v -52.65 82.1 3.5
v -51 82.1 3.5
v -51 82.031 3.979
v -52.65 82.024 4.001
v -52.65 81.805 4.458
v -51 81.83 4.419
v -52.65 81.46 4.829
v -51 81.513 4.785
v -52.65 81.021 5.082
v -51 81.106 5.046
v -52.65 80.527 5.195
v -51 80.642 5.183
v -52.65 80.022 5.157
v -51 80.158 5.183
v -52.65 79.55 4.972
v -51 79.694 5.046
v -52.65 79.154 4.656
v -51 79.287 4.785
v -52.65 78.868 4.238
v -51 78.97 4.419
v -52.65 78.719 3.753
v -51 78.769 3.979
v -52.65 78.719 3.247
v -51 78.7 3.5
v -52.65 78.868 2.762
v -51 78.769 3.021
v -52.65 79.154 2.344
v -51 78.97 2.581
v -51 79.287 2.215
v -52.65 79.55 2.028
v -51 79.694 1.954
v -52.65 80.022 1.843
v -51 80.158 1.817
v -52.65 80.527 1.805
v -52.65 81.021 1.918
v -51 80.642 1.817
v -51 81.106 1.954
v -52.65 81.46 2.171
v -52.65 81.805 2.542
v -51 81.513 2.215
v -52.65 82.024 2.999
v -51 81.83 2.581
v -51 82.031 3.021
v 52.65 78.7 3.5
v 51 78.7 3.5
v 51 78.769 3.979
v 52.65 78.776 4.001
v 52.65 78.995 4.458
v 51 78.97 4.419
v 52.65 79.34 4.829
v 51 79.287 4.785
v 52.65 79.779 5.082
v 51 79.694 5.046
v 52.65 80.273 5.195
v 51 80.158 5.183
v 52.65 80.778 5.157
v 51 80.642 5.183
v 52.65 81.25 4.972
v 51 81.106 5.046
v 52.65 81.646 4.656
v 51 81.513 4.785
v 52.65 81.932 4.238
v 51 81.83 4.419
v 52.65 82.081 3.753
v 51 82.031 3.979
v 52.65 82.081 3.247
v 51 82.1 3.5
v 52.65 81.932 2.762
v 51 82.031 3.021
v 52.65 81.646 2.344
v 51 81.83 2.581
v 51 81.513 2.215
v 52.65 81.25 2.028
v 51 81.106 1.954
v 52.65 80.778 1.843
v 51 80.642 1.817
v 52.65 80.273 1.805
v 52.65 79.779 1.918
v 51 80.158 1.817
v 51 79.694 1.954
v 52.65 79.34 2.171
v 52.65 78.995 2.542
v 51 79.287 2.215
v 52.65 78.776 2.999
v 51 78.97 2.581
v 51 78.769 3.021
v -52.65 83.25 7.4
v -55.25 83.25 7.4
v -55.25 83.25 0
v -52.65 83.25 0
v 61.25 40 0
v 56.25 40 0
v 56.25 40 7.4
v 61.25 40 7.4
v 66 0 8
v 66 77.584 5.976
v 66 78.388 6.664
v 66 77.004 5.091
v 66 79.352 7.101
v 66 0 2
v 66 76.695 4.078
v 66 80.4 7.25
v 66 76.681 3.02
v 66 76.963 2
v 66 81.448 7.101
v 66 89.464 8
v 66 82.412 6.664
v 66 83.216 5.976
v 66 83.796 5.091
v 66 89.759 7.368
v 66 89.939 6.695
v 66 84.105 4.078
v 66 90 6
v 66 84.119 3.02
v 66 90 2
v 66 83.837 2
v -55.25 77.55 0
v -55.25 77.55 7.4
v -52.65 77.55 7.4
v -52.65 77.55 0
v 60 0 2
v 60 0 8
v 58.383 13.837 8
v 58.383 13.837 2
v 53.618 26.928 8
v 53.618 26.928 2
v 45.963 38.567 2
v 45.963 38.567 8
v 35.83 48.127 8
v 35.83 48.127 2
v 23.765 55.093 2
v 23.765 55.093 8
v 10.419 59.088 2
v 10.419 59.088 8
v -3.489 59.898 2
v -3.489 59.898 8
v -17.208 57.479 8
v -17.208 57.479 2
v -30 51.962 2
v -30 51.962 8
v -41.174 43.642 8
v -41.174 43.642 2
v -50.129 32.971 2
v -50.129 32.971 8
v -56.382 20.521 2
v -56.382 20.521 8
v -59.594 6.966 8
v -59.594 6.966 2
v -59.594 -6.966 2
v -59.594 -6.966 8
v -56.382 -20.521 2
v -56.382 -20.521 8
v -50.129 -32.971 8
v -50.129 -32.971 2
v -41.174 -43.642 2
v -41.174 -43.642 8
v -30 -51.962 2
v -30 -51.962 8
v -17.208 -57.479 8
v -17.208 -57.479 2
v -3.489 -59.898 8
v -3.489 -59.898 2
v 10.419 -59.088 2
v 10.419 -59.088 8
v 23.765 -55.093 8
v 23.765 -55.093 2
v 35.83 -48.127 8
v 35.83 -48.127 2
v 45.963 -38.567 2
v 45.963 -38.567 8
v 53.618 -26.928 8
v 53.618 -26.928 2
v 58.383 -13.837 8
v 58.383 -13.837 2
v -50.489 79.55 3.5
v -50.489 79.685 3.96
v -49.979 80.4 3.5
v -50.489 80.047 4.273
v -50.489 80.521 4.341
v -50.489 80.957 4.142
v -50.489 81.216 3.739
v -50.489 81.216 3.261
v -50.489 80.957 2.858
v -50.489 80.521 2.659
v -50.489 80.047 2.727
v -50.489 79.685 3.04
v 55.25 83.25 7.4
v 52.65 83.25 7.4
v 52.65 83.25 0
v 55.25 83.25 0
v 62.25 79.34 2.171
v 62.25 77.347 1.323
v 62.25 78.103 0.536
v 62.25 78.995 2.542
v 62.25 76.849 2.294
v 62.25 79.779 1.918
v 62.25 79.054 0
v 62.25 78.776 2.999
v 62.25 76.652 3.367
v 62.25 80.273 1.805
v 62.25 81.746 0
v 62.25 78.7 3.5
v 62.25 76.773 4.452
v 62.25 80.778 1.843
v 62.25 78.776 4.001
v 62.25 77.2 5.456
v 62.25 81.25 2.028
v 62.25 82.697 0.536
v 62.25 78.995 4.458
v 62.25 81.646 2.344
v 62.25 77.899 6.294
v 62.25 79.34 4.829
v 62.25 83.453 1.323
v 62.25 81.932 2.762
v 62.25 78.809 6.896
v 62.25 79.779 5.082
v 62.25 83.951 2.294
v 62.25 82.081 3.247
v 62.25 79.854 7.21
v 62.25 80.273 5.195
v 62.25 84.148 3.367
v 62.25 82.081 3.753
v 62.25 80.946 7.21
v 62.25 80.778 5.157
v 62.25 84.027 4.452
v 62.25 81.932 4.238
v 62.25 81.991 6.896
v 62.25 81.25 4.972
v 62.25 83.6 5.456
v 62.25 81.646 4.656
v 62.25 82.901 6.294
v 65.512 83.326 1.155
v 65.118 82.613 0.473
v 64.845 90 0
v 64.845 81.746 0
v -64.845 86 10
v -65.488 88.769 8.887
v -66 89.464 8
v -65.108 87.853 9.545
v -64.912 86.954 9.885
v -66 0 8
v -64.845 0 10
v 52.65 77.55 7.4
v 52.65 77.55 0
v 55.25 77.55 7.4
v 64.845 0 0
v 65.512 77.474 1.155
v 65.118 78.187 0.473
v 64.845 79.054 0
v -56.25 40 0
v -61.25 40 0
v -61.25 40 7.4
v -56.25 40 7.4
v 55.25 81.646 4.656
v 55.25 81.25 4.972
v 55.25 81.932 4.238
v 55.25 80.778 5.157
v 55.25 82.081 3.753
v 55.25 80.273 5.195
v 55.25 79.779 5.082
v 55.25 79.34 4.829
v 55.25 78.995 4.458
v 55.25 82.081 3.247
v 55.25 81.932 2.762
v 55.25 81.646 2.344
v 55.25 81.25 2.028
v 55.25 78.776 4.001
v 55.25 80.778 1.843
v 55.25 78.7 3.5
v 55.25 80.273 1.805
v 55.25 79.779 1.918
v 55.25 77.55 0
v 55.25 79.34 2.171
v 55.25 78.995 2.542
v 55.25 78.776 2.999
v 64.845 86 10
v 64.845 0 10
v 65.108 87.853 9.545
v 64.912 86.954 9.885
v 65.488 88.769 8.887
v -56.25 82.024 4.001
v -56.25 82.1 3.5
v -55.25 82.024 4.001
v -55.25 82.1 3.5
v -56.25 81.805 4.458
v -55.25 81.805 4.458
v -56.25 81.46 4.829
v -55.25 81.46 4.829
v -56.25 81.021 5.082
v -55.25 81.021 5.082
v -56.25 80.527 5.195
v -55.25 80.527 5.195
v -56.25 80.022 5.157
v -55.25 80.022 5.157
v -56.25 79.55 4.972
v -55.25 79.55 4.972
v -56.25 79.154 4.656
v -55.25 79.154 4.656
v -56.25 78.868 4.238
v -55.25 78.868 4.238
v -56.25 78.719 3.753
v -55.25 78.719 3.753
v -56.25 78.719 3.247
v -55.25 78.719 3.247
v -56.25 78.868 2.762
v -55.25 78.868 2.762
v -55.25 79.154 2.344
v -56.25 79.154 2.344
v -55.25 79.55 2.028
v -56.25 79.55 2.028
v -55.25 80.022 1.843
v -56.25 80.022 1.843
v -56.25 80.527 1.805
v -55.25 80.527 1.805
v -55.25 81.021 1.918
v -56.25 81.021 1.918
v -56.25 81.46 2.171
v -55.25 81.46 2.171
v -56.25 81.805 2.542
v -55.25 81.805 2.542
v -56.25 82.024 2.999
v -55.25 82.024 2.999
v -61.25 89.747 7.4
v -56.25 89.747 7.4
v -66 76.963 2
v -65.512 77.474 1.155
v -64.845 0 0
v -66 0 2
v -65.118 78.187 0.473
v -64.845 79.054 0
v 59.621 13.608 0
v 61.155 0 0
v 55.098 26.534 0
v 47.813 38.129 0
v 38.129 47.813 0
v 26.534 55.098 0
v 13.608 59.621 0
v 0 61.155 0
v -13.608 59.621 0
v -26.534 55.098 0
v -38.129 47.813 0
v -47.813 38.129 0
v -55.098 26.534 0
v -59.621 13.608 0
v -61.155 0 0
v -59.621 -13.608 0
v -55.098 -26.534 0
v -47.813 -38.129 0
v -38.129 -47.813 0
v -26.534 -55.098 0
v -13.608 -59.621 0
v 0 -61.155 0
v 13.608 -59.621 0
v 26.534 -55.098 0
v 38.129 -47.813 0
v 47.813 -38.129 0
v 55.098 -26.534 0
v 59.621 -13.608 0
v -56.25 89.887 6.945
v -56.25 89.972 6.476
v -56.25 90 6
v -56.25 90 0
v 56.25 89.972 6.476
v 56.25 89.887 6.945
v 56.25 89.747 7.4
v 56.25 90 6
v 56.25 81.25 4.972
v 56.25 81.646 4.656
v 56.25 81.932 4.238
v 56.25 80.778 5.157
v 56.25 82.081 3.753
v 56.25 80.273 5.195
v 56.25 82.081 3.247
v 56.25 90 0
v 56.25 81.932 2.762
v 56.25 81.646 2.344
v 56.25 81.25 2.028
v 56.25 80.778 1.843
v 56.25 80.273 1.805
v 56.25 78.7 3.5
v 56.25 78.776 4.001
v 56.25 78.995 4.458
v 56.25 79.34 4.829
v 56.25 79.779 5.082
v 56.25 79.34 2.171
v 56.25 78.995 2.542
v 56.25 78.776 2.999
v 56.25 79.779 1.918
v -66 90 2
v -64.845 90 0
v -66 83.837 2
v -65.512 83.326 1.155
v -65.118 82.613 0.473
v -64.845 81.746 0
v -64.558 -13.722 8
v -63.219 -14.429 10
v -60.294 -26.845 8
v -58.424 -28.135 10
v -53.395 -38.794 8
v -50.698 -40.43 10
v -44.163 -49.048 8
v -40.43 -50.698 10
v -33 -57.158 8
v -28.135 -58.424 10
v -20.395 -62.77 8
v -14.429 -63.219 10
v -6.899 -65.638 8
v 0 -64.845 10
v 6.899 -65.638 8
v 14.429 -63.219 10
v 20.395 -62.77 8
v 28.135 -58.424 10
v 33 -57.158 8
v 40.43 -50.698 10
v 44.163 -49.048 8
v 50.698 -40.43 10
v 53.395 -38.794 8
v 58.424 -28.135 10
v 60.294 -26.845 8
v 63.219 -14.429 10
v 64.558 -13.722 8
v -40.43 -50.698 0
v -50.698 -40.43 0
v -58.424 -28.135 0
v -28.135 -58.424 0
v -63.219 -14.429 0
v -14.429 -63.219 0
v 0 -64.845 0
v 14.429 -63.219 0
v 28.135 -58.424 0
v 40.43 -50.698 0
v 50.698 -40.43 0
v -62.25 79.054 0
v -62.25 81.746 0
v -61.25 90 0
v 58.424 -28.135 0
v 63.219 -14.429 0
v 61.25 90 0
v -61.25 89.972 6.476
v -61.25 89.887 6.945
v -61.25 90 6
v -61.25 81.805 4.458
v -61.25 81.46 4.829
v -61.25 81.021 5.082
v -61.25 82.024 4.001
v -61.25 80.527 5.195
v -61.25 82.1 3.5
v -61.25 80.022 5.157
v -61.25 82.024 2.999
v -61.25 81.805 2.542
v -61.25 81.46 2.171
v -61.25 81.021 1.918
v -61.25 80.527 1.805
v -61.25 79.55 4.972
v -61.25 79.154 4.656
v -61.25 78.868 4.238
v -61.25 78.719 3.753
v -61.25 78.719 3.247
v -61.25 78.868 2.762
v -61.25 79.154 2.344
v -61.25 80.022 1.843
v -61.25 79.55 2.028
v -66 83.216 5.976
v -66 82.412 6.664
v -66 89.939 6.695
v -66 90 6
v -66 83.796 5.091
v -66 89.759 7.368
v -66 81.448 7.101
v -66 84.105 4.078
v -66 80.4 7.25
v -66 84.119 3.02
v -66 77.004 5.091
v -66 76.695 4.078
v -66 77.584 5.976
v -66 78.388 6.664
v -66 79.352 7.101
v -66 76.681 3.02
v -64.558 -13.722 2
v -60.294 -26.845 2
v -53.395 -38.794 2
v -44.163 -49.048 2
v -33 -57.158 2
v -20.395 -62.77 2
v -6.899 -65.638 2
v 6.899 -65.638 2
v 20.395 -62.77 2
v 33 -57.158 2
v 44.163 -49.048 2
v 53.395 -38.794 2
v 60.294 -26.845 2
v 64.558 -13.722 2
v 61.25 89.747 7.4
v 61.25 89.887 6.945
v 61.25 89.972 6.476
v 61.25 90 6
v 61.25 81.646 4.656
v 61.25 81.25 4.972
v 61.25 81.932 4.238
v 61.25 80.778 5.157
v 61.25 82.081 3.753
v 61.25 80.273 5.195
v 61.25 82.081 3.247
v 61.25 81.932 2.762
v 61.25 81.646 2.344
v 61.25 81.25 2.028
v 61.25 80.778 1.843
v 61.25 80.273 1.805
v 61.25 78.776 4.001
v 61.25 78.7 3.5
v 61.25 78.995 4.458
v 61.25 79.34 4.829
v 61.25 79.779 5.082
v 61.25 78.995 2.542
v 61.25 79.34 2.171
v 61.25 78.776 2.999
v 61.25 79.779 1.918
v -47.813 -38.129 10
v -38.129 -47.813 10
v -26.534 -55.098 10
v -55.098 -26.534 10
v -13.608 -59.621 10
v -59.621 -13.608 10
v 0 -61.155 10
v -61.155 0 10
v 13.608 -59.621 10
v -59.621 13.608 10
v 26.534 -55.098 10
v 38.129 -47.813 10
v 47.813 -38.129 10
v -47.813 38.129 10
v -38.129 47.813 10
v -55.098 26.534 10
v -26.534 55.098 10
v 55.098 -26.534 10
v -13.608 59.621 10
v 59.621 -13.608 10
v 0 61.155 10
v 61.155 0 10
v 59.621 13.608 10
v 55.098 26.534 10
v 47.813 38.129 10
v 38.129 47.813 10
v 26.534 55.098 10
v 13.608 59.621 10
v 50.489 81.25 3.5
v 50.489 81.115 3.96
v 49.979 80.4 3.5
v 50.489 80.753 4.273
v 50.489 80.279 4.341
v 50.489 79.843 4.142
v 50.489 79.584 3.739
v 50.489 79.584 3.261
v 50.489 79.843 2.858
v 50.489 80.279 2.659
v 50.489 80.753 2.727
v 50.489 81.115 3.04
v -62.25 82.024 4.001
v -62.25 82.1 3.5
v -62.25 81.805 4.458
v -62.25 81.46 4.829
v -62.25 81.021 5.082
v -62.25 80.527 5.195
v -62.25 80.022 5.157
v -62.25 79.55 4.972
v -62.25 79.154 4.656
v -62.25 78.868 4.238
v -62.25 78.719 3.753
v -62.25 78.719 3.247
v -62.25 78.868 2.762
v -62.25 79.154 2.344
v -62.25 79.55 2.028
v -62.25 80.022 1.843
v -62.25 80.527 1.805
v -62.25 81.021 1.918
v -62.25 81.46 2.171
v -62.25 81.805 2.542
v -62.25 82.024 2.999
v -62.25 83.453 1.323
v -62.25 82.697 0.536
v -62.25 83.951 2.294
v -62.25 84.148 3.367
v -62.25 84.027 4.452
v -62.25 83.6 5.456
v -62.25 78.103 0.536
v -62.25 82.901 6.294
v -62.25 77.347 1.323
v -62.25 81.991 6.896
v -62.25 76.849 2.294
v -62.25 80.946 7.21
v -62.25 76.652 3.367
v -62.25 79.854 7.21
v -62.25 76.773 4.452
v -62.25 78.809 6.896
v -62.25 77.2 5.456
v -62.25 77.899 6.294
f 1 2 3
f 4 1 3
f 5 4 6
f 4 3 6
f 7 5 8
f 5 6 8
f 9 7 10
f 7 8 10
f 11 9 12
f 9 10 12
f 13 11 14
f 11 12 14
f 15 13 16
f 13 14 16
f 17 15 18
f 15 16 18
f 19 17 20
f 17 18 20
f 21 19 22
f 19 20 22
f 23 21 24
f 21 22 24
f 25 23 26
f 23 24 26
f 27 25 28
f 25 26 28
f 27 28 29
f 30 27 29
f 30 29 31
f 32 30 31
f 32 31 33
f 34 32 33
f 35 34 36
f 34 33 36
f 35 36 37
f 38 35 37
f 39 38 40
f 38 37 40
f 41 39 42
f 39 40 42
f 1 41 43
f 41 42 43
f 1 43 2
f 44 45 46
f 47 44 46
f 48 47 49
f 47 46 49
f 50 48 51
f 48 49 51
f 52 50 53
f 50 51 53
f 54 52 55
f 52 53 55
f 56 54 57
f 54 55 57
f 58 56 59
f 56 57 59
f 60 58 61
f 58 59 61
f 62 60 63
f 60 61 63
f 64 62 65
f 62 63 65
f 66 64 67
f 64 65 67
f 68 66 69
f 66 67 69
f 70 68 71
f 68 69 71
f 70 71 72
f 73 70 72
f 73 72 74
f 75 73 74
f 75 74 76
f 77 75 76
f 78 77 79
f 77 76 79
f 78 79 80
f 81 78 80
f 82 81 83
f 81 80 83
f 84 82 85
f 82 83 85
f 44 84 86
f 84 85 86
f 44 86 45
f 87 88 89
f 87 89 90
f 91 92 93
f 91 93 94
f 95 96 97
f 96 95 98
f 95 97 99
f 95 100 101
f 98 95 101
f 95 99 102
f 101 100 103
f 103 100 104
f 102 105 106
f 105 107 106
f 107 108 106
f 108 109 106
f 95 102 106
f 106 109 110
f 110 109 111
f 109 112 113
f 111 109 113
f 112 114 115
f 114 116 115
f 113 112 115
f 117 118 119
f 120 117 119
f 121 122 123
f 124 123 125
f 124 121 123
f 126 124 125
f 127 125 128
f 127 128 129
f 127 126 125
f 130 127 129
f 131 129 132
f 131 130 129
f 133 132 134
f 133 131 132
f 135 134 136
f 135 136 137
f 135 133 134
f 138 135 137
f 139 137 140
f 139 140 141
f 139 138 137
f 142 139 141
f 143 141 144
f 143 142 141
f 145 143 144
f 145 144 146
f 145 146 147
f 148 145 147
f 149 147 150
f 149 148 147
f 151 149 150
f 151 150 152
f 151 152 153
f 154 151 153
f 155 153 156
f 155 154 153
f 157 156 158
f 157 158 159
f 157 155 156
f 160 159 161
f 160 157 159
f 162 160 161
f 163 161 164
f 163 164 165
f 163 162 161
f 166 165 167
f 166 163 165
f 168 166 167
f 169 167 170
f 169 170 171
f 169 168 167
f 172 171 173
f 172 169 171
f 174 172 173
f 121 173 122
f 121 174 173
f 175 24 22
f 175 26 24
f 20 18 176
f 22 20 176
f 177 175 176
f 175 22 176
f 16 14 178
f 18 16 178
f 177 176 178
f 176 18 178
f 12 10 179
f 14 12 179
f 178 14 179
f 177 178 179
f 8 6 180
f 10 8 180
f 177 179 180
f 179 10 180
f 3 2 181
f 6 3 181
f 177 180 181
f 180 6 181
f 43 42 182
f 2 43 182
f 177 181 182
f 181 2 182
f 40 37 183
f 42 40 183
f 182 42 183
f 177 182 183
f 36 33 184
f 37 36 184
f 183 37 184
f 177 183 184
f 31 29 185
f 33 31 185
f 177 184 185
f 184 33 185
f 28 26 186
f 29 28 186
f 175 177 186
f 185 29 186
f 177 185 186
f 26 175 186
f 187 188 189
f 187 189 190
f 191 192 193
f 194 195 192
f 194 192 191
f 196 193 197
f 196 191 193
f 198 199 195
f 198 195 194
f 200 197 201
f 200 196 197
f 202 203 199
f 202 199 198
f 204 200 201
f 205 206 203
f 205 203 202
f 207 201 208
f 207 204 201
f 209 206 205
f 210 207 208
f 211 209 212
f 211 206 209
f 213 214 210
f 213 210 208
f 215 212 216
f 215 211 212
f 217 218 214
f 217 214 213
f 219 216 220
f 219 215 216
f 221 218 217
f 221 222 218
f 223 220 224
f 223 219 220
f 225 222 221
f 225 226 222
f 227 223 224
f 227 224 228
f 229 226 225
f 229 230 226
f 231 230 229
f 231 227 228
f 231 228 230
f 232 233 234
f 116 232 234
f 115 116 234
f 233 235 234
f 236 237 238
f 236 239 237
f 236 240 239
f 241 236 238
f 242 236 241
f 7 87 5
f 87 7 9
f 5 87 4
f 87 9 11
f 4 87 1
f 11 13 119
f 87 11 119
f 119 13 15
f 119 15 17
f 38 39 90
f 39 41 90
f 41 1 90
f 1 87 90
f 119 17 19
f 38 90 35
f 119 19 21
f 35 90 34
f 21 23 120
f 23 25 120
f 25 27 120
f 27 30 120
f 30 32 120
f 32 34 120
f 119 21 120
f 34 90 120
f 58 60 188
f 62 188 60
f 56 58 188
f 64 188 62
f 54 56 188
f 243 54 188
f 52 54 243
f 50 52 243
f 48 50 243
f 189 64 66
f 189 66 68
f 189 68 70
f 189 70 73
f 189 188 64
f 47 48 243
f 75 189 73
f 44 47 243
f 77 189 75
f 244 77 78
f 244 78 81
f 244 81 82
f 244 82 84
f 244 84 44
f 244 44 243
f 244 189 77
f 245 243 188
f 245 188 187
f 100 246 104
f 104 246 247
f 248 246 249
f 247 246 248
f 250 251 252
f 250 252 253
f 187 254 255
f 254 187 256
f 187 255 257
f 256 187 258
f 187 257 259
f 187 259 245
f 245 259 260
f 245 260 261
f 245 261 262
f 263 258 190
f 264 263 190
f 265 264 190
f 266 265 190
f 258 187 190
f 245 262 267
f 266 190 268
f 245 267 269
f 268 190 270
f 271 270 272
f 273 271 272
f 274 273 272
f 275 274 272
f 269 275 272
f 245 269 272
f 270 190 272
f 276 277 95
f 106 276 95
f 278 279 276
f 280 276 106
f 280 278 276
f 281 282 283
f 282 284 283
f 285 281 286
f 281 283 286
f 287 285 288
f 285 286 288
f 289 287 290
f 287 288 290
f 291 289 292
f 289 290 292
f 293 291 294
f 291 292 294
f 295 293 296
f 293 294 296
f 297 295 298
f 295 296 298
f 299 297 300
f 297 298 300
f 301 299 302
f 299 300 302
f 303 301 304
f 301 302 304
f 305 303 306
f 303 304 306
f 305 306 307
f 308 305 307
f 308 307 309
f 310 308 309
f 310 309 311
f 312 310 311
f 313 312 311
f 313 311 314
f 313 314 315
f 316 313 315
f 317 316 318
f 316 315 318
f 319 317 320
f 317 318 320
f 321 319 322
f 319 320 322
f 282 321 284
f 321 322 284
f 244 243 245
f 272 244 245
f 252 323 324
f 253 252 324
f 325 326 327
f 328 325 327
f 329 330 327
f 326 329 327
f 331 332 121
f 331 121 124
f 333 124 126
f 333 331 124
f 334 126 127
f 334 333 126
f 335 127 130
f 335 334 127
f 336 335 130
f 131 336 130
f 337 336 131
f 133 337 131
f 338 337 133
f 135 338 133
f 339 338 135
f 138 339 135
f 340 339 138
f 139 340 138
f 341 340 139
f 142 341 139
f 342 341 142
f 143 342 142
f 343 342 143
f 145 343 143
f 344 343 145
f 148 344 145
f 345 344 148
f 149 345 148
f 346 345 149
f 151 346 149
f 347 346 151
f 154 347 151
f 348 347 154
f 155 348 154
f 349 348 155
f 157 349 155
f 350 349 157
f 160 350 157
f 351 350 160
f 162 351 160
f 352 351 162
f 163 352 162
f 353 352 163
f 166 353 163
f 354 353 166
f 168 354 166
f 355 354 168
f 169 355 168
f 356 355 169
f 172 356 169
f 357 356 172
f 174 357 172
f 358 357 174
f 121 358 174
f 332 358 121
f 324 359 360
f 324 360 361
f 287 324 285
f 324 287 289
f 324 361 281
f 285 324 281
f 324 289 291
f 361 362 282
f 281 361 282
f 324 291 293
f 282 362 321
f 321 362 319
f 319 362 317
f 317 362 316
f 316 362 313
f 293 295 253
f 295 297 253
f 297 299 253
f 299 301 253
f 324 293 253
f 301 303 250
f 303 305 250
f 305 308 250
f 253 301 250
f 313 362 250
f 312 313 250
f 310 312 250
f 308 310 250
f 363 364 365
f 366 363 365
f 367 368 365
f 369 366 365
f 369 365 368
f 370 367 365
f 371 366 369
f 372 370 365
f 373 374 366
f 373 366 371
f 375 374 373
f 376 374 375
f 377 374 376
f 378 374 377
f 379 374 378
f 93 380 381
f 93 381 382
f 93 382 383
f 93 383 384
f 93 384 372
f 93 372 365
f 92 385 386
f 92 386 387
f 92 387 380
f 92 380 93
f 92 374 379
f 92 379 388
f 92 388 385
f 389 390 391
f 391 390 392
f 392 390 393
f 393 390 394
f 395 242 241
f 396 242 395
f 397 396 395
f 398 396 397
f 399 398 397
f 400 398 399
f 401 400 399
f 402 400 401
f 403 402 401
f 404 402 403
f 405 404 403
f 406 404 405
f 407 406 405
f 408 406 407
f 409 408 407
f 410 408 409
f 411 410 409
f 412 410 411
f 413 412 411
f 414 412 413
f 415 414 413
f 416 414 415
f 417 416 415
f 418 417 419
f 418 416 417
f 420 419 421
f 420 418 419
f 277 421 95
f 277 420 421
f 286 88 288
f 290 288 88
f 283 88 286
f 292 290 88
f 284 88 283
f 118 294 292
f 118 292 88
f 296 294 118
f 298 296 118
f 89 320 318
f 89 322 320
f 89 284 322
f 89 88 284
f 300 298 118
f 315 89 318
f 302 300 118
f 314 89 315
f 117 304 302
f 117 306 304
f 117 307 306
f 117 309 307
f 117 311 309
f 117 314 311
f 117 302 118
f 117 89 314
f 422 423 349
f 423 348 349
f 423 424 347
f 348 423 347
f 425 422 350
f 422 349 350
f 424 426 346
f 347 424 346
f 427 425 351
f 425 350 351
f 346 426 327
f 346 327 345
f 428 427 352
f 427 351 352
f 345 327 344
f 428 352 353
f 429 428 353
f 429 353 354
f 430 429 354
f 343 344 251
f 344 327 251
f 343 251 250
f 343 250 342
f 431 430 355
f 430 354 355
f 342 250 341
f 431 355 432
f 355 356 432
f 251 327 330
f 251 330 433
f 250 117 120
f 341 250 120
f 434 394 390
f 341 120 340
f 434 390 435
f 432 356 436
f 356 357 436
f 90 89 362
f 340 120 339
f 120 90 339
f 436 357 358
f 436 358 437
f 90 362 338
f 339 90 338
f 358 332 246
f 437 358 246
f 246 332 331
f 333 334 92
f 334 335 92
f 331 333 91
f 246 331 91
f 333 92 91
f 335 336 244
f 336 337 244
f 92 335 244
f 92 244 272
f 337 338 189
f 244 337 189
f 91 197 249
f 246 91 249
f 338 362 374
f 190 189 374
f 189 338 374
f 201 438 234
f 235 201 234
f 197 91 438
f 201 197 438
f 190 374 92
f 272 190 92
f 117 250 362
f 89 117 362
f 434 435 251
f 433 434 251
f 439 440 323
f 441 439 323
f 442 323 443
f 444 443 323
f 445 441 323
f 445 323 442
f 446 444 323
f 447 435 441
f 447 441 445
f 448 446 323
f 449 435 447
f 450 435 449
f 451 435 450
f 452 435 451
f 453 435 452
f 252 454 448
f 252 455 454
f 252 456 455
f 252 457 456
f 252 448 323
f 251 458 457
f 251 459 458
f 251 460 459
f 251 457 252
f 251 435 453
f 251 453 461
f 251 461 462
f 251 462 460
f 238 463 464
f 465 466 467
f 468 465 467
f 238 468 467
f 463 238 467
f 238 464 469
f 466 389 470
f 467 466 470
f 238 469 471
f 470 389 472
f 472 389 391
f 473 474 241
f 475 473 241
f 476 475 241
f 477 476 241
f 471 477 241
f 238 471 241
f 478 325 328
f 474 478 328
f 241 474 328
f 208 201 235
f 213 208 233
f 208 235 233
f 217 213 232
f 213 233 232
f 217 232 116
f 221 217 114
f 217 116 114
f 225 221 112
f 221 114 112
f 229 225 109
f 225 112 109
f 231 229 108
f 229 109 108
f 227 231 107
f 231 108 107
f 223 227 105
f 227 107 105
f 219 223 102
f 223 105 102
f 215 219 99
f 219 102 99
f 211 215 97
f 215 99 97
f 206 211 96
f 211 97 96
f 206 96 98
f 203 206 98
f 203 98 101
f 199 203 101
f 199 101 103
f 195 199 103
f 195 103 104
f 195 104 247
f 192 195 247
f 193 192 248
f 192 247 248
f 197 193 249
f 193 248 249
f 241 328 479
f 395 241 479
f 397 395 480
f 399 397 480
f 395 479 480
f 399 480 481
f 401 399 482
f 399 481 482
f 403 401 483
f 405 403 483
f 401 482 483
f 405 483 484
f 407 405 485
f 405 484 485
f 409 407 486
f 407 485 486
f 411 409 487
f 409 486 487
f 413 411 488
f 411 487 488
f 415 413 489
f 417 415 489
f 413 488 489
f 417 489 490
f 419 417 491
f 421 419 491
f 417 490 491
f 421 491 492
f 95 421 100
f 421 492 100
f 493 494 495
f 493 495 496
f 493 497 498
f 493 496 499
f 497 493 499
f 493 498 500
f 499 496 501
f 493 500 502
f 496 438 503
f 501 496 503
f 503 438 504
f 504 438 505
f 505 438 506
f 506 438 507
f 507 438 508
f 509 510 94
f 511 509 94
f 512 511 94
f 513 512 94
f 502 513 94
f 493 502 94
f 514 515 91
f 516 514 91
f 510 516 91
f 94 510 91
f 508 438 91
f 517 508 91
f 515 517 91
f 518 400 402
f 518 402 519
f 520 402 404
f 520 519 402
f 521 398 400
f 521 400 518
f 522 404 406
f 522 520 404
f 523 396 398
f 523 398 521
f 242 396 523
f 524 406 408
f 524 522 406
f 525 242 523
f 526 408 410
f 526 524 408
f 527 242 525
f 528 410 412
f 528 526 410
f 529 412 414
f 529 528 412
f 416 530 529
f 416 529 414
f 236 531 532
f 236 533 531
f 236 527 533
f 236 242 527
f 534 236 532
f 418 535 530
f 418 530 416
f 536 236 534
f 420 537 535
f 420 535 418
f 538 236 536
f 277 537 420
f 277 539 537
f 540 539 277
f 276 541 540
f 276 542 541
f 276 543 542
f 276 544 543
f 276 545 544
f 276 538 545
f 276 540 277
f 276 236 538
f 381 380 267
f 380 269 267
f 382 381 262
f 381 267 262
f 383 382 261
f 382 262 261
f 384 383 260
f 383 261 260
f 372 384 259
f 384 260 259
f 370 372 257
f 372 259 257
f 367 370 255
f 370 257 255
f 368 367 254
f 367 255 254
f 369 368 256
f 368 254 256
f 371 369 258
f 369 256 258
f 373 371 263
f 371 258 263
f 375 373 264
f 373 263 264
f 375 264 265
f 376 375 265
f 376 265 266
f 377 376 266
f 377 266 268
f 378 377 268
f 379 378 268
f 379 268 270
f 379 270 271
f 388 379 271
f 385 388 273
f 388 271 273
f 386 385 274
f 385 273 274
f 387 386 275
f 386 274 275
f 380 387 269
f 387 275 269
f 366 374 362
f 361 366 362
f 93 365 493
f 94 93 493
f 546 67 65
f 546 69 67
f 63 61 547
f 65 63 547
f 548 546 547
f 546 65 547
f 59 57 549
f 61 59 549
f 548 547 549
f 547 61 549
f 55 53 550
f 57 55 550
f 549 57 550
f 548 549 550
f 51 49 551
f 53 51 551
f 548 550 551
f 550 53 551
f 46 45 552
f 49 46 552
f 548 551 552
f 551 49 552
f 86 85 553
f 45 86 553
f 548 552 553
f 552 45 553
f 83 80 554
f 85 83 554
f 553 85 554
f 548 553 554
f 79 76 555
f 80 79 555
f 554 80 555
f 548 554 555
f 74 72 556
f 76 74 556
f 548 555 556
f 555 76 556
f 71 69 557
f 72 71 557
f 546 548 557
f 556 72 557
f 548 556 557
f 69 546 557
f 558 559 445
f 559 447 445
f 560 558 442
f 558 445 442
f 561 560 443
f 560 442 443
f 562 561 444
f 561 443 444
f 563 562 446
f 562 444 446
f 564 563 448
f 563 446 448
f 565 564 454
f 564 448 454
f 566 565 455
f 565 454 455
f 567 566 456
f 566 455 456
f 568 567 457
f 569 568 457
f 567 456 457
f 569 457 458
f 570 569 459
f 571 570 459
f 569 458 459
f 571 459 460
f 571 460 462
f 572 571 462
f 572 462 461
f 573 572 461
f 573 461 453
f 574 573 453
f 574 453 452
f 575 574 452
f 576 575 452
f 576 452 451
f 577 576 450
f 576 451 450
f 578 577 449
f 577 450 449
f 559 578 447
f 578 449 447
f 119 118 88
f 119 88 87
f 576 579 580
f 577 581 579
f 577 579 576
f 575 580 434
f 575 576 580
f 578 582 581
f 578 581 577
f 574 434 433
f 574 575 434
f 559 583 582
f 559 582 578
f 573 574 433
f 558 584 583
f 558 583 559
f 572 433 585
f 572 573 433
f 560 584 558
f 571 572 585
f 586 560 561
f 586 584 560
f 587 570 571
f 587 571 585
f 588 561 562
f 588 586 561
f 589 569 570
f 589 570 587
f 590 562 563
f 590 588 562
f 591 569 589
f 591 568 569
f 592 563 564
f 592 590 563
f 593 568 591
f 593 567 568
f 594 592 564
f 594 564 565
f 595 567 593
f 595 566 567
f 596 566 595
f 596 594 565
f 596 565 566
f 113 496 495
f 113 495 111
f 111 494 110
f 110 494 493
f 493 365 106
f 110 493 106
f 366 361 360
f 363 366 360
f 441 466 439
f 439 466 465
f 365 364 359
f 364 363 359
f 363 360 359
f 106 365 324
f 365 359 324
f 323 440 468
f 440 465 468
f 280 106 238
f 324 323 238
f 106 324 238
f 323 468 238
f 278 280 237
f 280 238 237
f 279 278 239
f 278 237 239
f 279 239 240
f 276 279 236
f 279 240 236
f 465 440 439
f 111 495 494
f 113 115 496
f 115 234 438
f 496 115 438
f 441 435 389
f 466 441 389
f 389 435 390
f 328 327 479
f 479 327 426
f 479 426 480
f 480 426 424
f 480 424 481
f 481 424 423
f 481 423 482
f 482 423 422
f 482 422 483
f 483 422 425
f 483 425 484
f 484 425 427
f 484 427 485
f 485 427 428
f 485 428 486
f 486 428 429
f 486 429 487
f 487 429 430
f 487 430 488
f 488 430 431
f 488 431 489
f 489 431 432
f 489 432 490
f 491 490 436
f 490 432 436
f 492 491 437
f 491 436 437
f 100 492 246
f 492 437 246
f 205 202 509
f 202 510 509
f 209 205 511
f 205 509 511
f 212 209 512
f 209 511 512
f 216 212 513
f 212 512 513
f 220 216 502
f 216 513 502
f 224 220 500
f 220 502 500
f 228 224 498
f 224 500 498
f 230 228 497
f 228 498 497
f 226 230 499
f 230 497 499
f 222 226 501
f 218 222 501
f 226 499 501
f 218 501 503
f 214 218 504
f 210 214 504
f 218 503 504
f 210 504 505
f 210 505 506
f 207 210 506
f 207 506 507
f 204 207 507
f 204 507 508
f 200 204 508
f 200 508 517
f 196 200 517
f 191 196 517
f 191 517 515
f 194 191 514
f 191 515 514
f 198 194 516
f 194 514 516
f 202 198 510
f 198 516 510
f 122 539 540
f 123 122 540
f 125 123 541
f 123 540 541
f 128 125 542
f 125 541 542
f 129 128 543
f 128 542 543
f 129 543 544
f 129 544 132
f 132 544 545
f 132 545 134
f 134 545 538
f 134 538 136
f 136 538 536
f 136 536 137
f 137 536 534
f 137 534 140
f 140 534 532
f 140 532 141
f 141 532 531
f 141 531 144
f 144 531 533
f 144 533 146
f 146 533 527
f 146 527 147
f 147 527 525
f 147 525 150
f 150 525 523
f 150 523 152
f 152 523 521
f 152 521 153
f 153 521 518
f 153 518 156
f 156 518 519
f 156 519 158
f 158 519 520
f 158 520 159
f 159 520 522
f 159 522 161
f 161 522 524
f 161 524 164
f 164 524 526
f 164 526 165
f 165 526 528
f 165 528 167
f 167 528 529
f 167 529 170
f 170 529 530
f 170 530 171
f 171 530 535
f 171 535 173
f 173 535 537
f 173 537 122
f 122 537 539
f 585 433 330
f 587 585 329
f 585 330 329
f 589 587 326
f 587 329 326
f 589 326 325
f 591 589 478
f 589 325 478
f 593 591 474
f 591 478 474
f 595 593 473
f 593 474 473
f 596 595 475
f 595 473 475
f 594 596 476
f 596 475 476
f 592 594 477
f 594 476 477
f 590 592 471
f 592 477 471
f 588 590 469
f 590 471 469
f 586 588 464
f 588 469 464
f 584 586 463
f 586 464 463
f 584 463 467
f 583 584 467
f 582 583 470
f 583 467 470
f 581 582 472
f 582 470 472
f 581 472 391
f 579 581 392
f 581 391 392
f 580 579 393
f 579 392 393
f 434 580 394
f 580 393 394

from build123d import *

# Parameters (mm, degrees)
F0_R                 = 60
F1_DEPTH             = 10
F2_SIZE2             = 1.1547005384
F2_SIZE              = 2
F2_2_SIZE2           = 1.1547005384
F2_2_SIZE            = 2
F3_R                 = 4
F4_W                 = 5
F4_H                 = 50
F4_W_2               = 2.6
F4_H_2               = 5.7
F5_DEPTH             = 7.4
F8_D                 = 3.4
F8_DEPTH             = 15
F8_CBORE_D           = 7.5
F8_CBORE_DEPTH       = 3.75
F8_TIP               = 1.0214630523
F8_ON_F7_D           = 3.4
F8_ON_F7_DEPTH       = 15
F8_ON_F7_CBORE_D     = 7.5
F8_ON_F7_CBORE_DEPTH = 3.75
F8_ON_F7_TIP         = 1.0214630523


with BuildPart() as f1:
    # F0 (on Top) → F1 (new body)
    with BuildSketch(Plane.XY):
        with BuildLine():
            Line((-66, 90), (-66, 0))
            ThreePointArc((-66, 0), (0, -66), (66, 0))
            Line((66, 0), (66, 90))
            Line((66, 90), (-66, 90))
        make_face()
        Circle(F0_R, mode=Mode.SUBTRACT)
    extrude(amount=F1_DEPTH)

    # F2
    f2_edges = [f1.edges().sort_by_distance(p)[0] for p in [
        (0, -66, 0),
        (0, -66, 10),
    ]]
    f2_side = f1.faces().sort_by_distance((0, -66, 5))[0]
    chamfer(f2_edges, length=F2_SIZE, length2=F2_SIZE2, reference=f2_side)

    # F2#2
    f2_2_edges = [f1.edges().sort_by_distance(p)[0] for p in [
        (-60, 0, 10),
        (-60, 0, 0),
    ]]
    f2_2_side = f1.faces().sort_by_distance((-60, 0, 5))[0]
    chamfer(f2_2_edges, length=F2_2_SIZE, length2=F2_2_SIZE2, reference=f2_2_side)

    # F3
    f3_edges = [f1.edges().sort_by_distance(p)[0] for p in [
        (0, 90, 10),
    ]]
    fillet(f3_edges, radius=F3_R)

    # F4 (on face) → F5 (cut)
    with BuildSketch(Plane(origin=(0, 0, 0), x_dir=(1, 0, 0), z_dir=(0, 0, -1))):
        with Locations((58.75, -65)):
            Rectangle(F4_W, F4_H)
        with Locations((-58.75, -65)):
            Rectangle(F4_W, F4_H)
        with Locations((-53.95, -80.4)):
            Rectangle(F4_W_2, F4_H_2)
        with Locations((53.95, -80.4)):
            Rectangle(F4_W_2, F4_H_2)
    extrude(amount=-F5_DEPTH, mode=Mode.SUBTRACT)

    # F8
    with Locations(Plane(origin=(-66, 0, 0), x_dir=(0, -1, 0), z_dir=(-1, 0, 0))):
        with Locations((-80.4, 3.5)):
            CounterBoreHole(F8_D / 2, F8_CBORE_D / 2, F8_CBORE_DEPTH, depth=F8_DEPTH)
            with Locations((0, 0, -(F8_DEPTH + F8_TIP / 2))):  # 118° drill point
                Cone(0, F8_D / 2, F8_TIP, mode=Mode.SUBTRACT)

    # F8 on F7
    with Locations(Plane.YZ.offset(66)):
        with Locations((80.4, 3.5)):
            CounterBoreHole(F8_ON_F7_D / 2, F8_ON_F7_CBORE_D / 2, F8_ON_F7_CBORE_DEPTH, depth=F8_ON_F7_DEPTH)
            with Locations((0, 0, -(F8_ON_F7_DEPTH + F8_ON_F7_TIP / 2))):  # 118° drill point
                Cone(0, F8_ON_F7_D / 2, F8_ON_F7_TIP, mode=Mode.SUBTRACT)


solid = f1.part
